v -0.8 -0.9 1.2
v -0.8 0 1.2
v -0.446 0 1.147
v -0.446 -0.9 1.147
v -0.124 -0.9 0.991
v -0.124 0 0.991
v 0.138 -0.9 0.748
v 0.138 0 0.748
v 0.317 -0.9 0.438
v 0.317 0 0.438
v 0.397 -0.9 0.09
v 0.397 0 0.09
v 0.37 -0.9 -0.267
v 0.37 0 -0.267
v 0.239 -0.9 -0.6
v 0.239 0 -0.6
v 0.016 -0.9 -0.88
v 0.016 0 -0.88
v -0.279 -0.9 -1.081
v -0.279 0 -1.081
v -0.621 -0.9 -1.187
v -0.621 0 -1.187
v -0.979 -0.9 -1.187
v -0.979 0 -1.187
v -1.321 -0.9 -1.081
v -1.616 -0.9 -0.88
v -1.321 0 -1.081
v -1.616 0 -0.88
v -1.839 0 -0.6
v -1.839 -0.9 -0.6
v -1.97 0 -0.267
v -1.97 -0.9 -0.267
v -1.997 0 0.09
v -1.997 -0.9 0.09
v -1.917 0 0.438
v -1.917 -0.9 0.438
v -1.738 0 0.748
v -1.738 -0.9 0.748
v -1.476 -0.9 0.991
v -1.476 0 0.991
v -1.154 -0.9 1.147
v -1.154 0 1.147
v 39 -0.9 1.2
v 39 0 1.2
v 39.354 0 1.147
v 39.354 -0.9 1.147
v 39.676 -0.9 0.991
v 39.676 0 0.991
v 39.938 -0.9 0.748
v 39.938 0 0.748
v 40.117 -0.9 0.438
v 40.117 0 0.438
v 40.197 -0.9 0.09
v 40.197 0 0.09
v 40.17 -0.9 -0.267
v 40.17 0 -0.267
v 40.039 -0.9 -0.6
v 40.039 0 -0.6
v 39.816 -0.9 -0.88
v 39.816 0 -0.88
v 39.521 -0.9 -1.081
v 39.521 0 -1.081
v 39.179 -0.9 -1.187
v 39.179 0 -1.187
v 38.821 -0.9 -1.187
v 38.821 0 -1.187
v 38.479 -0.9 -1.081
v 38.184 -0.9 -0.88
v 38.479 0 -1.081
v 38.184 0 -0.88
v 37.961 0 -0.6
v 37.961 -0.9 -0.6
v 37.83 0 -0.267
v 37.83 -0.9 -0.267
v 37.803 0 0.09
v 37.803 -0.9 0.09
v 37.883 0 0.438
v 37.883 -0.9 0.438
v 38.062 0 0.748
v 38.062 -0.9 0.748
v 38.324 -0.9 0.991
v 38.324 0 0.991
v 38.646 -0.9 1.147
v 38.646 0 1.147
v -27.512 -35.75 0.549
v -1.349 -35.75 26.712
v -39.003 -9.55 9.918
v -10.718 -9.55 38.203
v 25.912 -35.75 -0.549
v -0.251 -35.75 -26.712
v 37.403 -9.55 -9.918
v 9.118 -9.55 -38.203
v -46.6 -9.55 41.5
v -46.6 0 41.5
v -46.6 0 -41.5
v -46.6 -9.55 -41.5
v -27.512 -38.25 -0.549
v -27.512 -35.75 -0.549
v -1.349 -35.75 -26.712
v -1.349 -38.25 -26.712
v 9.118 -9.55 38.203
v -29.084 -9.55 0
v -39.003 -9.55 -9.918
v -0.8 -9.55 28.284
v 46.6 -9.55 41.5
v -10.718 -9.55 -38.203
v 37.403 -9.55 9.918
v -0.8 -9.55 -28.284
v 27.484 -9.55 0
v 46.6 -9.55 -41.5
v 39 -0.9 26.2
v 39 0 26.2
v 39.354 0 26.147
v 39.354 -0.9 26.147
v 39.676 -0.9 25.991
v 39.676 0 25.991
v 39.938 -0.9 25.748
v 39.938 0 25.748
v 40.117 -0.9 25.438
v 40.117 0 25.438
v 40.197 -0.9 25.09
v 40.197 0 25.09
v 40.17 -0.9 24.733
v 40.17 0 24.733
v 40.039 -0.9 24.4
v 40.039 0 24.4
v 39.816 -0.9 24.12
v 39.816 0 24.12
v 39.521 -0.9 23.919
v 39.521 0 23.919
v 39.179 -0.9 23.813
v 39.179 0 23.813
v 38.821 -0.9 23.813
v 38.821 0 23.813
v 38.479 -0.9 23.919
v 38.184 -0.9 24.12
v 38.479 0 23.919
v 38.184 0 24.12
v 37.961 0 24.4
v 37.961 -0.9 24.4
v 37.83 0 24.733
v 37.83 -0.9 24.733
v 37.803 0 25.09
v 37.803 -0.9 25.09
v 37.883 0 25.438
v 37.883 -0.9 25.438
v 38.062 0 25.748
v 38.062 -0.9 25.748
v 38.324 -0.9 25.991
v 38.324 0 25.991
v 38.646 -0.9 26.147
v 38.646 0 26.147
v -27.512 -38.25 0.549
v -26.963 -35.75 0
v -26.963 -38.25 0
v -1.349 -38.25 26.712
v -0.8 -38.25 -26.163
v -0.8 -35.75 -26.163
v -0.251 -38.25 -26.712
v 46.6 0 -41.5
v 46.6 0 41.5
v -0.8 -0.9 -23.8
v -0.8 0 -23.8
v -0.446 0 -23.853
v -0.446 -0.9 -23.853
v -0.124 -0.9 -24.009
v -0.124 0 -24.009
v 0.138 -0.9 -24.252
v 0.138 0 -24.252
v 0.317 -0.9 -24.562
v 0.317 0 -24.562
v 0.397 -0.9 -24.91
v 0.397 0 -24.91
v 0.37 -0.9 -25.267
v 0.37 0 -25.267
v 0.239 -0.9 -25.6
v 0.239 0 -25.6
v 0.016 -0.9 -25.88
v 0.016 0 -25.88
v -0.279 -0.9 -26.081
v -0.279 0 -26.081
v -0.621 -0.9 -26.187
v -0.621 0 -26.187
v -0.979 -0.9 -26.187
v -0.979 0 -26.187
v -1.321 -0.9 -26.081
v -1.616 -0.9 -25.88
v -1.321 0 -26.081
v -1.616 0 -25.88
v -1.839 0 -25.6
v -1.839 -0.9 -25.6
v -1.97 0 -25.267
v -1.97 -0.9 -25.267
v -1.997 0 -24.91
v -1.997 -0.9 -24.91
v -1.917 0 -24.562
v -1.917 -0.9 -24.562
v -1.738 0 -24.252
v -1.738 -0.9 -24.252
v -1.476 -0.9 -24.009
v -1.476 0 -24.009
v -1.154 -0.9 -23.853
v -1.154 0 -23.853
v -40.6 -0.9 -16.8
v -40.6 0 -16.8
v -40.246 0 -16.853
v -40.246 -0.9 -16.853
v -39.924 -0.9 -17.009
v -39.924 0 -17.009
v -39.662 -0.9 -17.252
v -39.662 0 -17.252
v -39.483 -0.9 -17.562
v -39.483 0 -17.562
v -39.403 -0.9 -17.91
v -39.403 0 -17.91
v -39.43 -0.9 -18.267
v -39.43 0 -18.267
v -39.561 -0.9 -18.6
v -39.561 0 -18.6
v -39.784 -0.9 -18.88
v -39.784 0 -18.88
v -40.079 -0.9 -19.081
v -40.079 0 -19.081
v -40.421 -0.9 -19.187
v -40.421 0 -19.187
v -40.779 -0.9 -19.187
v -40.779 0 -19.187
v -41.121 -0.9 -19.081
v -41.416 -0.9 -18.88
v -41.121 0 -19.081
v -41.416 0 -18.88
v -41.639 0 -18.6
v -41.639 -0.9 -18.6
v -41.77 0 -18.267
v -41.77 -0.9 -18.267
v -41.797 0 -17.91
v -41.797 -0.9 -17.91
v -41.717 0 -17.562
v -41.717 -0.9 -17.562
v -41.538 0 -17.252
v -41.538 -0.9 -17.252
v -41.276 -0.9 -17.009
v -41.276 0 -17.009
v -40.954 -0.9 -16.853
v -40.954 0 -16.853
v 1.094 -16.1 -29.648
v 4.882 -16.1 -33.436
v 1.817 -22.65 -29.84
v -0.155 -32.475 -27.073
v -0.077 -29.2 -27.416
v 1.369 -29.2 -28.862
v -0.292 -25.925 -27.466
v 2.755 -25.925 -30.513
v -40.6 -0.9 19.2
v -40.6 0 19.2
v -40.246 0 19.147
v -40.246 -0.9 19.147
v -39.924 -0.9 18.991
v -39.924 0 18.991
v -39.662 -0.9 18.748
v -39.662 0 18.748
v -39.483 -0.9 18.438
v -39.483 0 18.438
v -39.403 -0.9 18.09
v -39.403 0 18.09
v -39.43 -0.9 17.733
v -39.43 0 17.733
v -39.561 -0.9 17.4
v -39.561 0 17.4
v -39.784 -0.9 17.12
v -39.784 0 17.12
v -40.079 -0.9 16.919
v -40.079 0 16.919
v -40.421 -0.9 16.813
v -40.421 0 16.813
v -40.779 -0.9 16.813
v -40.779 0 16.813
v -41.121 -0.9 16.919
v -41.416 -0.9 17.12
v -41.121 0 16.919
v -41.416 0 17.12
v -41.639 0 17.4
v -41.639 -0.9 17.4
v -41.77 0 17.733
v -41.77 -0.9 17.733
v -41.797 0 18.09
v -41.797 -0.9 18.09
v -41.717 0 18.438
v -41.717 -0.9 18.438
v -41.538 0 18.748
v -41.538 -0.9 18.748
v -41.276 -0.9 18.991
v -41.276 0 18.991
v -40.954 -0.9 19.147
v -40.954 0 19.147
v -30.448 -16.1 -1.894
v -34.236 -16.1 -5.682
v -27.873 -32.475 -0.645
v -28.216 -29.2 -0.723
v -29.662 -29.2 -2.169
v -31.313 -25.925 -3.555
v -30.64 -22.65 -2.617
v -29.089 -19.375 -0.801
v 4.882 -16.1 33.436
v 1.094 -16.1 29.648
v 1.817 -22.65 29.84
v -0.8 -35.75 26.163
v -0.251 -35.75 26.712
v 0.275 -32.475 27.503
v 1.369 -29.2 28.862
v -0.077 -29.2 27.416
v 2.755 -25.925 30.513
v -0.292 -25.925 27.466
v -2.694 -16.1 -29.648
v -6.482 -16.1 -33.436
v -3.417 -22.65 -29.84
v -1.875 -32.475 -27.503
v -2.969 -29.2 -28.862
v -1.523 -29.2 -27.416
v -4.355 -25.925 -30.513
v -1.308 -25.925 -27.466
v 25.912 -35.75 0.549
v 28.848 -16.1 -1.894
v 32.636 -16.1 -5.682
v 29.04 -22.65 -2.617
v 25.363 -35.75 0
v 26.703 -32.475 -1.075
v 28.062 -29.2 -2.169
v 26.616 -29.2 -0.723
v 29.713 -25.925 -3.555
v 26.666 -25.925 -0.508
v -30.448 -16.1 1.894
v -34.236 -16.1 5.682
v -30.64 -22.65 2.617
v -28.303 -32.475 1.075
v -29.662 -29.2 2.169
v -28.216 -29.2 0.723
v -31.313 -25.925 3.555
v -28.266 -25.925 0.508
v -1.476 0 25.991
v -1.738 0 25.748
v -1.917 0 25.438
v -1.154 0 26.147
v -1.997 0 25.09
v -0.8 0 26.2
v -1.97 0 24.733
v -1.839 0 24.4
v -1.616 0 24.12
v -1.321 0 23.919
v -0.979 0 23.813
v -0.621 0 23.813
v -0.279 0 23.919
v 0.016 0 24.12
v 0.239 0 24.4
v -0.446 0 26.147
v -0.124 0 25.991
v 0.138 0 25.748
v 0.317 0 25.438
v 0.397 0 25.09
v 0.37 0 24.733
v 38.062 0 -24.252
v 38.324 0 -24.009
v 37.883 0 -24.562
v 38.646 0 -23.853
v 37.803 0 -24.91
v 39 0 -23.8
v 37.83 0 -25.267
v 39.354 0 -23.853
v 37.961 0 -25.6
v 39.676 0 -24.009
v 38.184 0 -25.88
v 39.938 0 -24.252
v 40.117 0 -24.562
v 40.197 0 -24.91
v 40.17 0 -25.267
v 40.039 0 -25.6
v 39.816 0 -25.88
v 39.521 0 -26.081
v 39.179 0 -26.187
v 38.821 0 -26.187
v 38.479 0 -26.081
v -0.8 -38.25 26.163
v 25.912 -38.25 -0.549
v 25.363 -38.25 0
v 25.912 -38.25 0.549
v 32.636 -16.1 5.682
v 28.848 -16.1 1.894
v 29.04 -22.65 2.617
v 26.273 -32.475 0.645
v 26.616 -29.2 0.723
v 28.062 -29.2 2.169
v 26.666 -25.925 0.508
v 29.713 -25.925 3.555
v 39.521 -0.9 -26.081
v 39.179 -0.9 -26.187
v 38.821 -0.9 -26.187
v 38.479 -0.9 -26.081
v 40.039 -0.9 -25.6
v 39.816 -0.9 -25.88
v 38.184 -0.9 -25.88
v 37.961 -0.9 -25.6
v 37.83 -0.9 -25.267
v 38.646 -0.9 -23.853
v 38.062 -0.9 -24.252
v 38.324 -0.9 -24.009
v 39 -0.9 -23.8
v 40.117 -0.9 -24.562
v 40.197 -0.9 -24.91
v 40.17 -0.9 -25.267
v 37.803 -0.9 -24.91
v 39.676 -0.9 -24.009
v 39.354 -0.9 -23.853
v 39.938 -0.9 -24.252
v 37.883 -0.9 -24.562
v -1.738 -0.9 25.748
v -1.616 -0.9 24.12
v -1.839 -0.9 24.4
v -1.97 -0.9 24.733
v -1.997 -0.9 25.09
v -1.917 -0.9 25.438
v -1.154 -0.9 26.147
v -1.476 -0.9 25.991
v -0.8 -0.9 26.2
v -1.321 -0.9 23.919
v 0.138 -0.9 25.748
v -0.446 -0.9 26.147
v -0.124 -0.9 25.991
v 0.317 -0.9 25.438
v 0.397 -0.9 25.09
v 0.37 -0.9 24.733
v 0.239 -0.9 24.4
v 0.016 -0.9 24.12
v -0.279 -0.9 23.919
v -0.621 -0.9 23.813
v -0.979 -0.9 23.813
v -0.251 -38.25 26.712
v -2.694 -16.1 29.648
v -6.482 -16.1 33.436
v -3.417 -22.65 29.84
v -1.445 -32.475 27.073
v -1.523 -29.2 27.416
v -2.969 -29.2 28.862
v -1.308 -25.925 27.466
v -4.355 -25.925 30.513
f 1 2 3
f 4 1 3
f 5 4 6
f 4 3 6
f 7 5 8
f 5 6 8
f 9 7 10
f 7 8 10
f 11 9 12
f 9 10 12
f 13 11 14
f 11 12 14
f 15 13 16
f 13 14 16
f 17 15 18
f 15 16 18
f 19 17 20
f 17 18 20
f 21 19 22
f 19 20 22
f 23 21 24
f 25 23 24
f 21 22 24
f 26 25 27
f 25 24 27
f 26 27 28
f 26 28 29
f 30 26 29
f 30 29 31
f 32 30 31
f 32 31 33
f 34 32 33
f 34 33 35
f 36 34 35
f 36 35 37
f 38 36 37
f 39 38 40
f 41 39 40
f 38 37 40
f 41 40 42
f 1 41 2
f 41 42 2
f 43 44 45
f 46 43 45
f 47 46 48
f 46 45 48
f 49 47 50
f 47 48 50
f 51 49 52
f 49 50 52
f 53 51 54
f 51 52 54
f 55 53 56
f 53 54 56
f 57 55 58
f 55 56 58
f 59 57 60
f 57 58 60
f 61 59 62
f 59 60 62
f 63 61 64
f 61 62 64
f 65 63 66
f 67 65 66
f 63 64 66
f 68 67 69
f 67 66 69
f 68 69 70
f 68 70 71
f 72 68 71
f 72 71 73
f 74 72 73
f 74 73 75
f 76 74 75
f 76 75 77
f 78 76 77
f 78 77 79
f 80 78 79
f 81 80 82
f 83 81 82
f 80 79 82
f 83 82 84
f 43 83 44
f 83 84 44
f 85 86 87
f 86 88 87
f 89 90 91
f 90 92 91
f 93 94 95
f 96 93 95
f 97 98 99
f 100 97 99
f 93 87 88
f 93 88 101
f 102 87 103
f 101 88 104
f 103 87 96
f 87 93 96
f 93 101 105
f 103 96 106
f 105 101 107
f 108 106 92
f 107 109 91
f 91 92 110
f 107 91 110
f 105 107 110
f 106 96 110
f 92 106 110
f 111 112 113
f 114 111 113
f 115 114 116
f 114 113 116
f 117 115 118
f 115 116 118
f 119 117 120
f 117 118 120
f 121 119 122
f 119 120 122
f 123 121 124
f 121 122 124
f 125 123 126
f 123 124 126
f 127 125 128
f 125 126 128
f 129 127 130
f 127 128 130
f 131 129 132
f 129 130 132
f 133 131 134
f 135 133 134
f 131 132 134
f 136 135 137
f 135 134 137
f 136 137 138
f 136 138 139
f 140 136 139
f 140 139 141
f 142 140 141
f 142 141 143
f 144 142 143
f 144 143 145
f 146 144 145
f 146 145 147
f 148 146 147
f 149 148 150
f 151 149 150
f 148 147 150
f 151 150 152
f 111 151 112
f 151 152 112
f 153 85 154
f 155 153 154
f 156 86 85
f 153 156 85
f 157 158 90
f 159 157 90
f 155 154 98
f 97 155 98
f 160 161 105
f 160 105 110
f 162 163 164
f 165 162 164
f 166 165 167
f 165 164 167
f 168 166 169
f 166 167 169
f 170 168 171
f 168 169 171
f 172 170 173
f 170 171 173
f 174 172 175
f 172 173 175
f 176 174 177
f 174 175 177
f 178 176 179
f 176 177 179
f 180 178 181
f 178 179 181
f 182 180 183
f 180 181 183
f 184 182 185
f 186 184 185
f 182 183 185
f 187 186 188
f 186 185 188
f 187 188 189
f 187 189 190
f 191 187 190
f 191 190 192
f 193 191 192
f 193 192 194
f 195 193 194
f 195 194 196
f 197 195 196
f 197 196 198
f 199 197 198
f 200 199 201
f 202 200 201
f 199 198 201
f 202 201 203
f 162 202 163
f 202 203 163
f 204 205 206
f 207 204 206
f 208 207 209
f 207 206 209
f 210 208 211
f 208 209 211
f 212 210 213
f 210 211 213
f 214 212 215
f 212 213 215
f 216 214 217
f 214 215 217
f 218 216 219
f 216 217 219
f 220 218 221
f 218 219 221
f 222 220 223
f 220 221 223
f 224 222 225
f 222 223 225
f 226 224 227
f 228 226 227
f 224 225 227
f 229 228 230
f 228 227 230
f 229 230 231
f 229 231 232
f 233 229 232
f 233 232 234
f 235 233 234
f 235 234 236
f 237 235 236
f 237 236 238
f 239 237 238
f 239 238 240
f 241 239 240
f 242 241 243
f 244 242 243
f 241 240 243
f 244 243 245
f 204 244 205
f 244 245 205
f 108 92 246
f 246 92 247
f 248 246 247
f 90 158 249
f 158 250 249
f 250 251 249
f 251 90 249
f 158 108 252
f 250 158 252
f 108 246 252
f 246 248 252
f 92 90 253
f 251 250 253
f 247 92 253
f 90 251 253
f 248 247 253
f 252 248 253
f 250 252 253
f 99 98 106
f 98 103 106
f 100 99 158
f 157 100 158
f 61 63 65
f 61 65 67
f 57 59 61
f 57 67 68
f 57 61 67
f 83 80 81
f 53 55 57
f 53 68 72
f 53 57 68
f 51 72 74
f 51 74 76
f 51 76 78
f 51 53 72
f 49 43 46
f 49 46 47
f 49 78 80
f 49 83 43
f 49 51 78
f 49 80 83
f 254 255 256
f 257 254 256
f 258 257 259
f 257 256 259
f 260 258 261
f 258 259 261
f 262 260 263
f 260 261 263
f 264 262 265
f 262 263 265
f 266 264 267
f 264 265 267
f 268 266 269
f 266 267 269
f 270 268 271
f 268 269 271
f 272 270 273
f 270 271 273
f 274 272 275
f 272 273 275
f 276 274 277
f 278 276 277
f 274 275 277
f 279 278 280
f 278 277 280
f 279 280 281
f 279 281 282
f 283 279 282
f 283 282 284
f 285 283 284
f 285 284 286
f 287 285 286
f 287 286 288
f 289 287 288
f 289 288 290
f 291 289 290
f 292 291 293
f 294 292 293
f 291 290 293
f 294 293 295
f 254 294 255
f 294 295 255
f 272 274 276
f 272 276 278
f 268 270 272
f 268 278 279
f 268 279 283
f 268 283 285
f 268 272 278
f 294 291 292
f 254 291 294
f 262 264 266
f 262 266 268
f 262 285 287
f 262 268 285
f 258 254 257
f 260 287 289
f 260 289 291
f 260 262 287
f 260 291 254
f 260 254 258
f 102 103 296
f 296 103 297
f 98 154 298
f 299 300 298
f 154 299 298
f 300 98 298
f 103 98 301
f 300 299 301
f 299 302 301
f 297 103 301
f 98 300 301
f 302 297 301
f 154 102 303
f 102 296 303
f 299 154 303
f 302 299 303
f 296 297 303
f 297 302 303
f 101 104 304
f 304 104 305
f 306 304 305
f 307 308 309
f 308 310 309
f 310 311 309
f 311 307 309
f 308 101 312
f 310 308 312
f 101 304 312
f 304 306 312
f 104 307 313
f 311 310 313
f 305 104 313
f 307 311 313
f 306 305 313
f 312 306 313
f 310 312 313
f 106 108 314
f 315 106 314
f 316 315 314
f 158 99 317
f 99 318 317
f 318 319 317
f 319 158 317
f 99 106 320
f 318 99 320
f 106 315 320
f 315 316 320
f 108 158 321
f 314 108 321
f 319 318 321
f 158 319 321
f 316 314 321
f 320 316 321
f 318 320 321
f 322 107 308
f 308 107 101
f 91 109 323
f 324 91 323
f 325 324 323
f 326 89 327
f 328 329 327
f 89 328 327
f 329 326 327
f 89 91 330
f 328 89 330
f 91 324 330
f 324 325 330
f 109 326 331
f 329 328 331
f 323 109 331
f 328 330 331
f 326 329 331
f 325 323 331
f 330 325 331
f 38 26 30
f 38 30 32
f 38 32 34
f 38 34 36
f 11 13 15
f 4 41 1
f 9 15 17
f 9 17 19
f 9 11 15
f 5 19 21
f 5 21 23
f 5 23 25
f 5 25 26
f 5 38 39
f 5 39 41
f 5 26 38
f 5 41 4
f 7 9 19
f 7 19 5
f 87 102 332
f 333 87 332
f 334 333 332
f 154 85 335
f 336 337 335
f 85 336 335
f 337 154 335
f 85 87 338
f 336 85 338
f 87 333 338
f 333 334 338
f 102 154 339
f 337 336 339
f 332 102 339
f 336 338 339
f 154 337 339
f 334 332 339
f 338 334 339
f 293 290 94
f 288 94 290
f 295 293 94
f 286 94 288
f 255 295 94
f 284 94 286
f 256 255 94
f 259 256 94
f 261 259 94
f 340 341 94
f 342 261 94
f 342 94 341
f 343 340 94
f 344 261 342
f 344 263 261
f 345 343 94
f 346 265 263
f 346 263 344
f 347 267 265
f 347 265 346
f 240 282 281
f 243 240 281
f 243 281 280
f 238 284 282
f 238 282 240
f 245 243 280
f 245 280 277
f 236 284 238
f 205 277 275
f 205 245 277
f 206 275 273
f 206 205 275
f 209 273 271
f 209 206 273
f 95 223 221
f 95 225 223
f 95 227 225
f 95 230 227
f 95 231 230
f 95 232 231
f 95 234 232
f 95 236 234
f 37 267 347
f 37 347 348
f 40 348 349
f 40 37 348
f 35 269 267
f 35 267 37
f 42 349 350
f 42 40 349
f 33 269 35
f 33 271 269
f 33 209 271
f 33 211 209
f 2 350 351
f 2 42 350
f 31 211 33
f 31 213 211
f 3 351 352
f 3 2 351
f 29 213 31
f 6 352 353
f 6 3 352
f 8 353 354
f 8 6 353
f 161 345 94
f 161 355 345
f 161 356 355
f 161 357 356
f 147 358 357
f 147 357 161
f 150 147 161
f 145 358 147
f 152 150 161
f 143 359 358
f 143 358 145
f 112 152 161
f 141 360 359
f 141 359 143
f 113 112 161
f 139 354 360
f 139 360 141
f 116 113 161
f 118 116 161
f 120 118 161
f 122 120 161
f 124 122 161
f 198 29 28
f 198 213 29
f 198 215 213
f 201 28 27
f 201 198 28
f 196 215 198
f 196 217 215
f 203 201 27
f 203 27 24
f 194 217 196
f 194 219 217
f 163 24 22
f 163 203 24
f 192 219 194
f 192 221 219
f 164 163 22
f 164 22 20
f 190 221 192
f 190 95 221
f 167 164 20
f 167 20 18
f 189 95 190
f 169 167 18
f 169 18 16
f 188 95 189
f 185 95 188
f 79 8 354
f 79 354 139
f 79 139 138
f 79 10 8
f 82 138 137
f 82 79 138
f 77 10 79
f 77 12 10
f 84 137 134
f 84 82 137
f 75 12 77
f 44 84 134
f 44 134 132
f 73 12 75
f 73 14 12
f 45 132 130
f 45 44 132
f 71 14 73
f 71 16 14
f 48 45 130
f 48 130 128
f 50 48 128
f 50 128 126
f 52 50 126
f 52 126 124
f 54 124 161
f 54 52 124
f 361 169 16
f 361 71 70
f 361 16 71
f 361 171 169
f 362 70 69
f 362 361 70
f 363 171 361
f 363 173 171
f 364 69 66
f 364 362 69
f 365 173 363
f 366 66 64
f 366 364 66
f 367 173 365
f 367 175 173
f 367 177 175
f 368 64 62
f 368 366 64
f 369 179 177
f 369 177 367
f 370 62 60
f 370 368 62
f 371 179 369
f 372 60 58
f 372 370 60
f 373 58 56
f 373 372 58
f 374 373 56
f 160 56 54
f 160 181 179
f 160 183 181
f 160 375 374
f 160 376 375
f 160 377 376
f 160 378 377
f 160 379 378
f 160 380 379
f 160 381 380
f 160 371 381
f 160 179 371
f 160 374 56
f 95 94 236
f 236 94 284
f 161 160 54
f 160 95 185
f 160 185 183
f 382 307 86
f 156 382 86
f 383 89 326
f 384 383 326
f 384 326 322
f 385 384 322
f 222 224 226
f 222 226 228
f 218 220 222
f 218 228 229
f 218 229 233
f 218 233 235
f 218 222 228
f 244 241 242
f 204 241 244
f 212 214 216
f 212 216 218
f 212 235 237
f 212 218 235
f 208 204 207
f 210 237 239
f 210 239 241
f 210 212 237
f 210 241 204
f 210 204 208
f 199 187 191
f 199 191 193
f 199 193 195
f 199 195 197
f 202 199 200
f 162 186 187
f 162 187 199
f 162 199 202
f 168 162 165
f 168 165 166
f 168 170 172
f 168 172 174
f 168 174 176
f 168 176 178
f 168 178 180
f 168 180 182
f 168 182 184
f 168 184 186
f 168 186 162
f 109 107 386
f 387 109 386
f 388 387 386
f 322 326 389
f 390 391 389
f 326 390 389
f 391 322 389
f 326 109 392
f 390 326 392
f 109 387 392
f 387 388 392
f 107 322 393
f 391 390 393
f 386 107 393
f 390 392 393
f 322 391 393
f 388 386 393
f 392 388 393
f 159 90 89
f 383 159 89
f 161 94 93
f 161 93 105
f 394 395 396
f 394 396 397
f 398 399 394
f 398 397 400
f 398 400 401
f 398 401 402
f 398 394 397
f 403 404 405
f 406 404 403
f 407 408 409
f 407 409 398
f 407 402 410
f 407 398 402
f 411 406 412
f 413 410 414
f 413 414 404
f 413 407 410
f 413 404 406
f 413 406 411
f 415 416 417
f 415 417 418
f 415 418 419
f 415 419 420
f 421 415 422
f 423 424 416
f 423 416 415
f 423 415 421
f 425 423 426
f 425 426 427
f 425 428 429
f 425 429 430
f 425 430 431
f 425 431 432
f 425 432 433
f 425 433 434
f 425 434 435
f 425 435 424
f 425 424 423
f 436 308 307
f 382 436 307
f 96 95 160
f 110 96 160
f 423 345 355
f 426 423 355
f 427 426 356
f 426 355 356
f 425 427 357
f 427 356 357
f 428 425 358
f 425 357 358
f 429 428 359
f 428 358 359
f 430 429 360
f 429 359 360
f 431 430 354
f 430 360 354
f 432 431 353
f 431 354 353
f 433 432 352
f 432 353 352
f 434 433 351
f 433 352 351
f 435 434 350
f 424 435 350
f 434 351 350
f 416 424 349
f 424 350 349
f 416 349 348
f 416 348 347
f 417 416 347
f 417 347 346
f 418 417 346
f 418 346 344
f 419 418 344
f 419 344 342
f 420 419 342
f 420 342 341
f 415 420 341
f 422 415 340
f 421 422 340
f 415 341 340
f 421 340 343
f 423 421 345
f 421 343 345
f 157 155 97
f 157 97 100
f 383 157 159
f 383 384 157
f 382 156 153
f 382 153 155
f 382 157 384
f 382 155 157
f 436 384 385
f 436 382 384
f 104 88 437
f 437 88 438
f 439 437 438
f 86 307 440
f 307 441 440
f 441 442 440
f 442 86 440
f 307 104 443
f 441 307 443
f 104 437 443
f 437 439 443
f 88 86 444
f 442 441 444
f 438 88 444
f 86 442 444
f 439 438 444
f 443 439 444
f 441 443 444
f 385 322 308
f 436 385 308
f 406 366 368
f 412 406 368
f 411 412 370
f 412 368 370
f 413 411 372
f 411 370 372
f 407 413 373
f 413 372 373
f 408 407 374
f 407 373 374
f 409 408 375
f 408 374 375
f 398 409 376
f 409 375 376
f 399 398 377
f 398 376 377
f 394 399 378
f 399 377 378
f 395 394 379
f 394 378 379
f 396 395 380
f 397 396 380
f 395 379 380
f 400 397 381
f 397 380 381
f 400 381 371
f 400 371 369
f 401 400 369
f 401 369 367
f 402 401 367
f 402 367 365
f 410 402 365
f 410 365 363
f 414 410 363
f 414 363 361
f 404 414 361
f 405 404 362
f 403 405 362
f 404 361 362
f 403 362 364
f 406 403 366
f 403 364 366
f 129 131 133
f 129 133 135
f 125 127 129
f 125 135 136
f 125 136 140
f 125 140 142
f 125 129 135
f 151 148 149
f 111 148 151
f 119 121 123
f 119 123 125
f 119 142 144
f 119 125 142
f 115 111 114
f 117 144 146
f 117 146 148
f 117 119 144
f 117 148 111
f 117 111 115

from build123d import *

# Parameters (mm, degrees)
SKETCH1_W           = 93.2
SKETCH1_H           = 83
BOSS_EXTRUDE1_DEPTH = 9.55
BOSS_EXTRUDE3_DEPTH = 2.5
SKETCH6_R           = 1.2
CUT_EXTRUDE1_DEPTH  = 0.9


with BuildPart() as part:
    # Sketch1 → Boss-Extrude1 (new body)
    with BuildSketch(Plane(origin=(0, 0, 0), x_dir=(1, 0, 0), z_dir=(0, 1, 0))):
        Rectangle(SKETCH1_W, SKETCH1_H)
    extrude(amount=-BOSS_EXTRUDE1_DEPTH)

    # Sketch3 → Loft3 section 0
    with BuildSketch(Plane(origin=(0, -35.75, 0), x_dir=(-1, 0, 0), z_dir=(0, -1, 0))):
        with BuildLine():
            Line((0.25082265, 26.712128254), (-25.912128254, 0.54917735))
            Line((-25.912128254, 0.54917735), (-25.362950904, 0))
            Line((-25.362950904, 0), (-25.912128254, -0.54917735))
            Line((-25.912128254, -0.54917735), (0.25082265, -26.712128254))
            Line((0.25082265, -26.712128254), (0.8, -26.162950904))
            Line((0.8, -26.162950904), (1.34917735, -26.712128254))
            Line((1.34917735, -26.712128254), (27.512128254, -0.54917735))
            Line((27.512128254, -0.54917735), (26.962950904, 0))
            Line((26.962950904, 0), (27.512128254, 0.54917735))
            Line((27.512128254, 0.54917735), (1.34917735, 26.712128254))
            Line((1.34917735, 26.712128254), (0.8, 26.162950904))
            Line((0.8, 26.162950904), (0.25082265, 26.712128254))
        make_face()
    # Sketch2 → Loft3 section 1
    with BuildSketch(Plane.XZ.offset(9.55)):
        with BuildLine():
            Line((-10.718342201, -38.202613448), (-0.8, -28.284271247))
            Line((-0.8, -28.284271247), (9.118342201, -38.202613448))
            Line((9.118342201, -38.202613448), (37.402613448, -9.918342201))
            Line((37.402613448, -9.918342201), (27.484271247, 0))
            Line((27.484271247, 0), (37.402613448, 9.918342201))
            Line((37.402613448, 9.918342201), (9.118342201, 38.202613448))
            Line((9.118342201, 38.202613448), (-0.8, 28.284271247))
            Line((-0.8, 28.284271247), (-10.718342201, 38.202613448))
            Line((-10.718342201, 38.202613448), (-39.002613448, 9.918342201))
            Line((-39.002613448, 9.918342201), (-29.084271247, 0))
            Line((-29.084271247, 0), (-39.002613448, -9.918342201))
            Line((-39.002613448, -9.918342201), (-10.718342201, -38.202613448))
        make_face()
    loft()

    # Sketch5 → Boss-Extrude3 (add)
    with BuildSketch(Plane.XZ.offset(35.75)):
        Polygon((-0.8, -26.162950904), (-0.25082265, -26.712128254), (25.912128254, -0.54917735), (25.362950904, 0), (25.912128254, 0.54917735), (-0.25082265, 26.712128254), (-0.8, 26.162950904), (-1.34917735, 26.712128254), (-27.512128254, 0.54917735), (-26.962950904, 0), (-27.512128254, -0.54917735), (-1.34917735, -26.712128254), align=None)
    extrude(amount=BOSS_EXTRUDE3_DEPTH)

    # Sketch6 → Cut-Extrude1 (cut)
    with BuildSketch(Plane(origin=(0, 0, 0), x_dir=(1, 0, 0), z_dir=(0, 1, 0))):
        with Locations(Location((39, -25, 0), (0, 0, 270))):
            Circle(SKETCH6_R)
        with Locations(Location((39, 0, 0), (0, 0, 270))):
            Circle(SKETCH6_R)
        with Locations(Location((39, 25, 0), (0, 0, 270))):
            Circle(SKETCH6_R)
        with Locations(Location((-40.6, 18, 0), (0, 0, 270))):
            Circle(SKETCH6_R)
        with Locations(Location((-40.6, -18, 0), (0, 0, 270))):
            Circle(SKETCH6_R)
        with Locations(Location((-0.8, -25, 0), (0, 0, 270))):
            Circle(SKETCH6_R)
        with Locations(Location((-0.8, 0, 0), (0, 0, 270))):
            Circle(SKETCH6_R)
        with Locations(Location((-0.8, 25, 0), (0, 0, 270))):
            Circle(SKETCH6_R)
    extrude(amount=-CUT_EXTRUDE1_DEPTH, mode=Mode.SUBTRACT)


solid = part.part
